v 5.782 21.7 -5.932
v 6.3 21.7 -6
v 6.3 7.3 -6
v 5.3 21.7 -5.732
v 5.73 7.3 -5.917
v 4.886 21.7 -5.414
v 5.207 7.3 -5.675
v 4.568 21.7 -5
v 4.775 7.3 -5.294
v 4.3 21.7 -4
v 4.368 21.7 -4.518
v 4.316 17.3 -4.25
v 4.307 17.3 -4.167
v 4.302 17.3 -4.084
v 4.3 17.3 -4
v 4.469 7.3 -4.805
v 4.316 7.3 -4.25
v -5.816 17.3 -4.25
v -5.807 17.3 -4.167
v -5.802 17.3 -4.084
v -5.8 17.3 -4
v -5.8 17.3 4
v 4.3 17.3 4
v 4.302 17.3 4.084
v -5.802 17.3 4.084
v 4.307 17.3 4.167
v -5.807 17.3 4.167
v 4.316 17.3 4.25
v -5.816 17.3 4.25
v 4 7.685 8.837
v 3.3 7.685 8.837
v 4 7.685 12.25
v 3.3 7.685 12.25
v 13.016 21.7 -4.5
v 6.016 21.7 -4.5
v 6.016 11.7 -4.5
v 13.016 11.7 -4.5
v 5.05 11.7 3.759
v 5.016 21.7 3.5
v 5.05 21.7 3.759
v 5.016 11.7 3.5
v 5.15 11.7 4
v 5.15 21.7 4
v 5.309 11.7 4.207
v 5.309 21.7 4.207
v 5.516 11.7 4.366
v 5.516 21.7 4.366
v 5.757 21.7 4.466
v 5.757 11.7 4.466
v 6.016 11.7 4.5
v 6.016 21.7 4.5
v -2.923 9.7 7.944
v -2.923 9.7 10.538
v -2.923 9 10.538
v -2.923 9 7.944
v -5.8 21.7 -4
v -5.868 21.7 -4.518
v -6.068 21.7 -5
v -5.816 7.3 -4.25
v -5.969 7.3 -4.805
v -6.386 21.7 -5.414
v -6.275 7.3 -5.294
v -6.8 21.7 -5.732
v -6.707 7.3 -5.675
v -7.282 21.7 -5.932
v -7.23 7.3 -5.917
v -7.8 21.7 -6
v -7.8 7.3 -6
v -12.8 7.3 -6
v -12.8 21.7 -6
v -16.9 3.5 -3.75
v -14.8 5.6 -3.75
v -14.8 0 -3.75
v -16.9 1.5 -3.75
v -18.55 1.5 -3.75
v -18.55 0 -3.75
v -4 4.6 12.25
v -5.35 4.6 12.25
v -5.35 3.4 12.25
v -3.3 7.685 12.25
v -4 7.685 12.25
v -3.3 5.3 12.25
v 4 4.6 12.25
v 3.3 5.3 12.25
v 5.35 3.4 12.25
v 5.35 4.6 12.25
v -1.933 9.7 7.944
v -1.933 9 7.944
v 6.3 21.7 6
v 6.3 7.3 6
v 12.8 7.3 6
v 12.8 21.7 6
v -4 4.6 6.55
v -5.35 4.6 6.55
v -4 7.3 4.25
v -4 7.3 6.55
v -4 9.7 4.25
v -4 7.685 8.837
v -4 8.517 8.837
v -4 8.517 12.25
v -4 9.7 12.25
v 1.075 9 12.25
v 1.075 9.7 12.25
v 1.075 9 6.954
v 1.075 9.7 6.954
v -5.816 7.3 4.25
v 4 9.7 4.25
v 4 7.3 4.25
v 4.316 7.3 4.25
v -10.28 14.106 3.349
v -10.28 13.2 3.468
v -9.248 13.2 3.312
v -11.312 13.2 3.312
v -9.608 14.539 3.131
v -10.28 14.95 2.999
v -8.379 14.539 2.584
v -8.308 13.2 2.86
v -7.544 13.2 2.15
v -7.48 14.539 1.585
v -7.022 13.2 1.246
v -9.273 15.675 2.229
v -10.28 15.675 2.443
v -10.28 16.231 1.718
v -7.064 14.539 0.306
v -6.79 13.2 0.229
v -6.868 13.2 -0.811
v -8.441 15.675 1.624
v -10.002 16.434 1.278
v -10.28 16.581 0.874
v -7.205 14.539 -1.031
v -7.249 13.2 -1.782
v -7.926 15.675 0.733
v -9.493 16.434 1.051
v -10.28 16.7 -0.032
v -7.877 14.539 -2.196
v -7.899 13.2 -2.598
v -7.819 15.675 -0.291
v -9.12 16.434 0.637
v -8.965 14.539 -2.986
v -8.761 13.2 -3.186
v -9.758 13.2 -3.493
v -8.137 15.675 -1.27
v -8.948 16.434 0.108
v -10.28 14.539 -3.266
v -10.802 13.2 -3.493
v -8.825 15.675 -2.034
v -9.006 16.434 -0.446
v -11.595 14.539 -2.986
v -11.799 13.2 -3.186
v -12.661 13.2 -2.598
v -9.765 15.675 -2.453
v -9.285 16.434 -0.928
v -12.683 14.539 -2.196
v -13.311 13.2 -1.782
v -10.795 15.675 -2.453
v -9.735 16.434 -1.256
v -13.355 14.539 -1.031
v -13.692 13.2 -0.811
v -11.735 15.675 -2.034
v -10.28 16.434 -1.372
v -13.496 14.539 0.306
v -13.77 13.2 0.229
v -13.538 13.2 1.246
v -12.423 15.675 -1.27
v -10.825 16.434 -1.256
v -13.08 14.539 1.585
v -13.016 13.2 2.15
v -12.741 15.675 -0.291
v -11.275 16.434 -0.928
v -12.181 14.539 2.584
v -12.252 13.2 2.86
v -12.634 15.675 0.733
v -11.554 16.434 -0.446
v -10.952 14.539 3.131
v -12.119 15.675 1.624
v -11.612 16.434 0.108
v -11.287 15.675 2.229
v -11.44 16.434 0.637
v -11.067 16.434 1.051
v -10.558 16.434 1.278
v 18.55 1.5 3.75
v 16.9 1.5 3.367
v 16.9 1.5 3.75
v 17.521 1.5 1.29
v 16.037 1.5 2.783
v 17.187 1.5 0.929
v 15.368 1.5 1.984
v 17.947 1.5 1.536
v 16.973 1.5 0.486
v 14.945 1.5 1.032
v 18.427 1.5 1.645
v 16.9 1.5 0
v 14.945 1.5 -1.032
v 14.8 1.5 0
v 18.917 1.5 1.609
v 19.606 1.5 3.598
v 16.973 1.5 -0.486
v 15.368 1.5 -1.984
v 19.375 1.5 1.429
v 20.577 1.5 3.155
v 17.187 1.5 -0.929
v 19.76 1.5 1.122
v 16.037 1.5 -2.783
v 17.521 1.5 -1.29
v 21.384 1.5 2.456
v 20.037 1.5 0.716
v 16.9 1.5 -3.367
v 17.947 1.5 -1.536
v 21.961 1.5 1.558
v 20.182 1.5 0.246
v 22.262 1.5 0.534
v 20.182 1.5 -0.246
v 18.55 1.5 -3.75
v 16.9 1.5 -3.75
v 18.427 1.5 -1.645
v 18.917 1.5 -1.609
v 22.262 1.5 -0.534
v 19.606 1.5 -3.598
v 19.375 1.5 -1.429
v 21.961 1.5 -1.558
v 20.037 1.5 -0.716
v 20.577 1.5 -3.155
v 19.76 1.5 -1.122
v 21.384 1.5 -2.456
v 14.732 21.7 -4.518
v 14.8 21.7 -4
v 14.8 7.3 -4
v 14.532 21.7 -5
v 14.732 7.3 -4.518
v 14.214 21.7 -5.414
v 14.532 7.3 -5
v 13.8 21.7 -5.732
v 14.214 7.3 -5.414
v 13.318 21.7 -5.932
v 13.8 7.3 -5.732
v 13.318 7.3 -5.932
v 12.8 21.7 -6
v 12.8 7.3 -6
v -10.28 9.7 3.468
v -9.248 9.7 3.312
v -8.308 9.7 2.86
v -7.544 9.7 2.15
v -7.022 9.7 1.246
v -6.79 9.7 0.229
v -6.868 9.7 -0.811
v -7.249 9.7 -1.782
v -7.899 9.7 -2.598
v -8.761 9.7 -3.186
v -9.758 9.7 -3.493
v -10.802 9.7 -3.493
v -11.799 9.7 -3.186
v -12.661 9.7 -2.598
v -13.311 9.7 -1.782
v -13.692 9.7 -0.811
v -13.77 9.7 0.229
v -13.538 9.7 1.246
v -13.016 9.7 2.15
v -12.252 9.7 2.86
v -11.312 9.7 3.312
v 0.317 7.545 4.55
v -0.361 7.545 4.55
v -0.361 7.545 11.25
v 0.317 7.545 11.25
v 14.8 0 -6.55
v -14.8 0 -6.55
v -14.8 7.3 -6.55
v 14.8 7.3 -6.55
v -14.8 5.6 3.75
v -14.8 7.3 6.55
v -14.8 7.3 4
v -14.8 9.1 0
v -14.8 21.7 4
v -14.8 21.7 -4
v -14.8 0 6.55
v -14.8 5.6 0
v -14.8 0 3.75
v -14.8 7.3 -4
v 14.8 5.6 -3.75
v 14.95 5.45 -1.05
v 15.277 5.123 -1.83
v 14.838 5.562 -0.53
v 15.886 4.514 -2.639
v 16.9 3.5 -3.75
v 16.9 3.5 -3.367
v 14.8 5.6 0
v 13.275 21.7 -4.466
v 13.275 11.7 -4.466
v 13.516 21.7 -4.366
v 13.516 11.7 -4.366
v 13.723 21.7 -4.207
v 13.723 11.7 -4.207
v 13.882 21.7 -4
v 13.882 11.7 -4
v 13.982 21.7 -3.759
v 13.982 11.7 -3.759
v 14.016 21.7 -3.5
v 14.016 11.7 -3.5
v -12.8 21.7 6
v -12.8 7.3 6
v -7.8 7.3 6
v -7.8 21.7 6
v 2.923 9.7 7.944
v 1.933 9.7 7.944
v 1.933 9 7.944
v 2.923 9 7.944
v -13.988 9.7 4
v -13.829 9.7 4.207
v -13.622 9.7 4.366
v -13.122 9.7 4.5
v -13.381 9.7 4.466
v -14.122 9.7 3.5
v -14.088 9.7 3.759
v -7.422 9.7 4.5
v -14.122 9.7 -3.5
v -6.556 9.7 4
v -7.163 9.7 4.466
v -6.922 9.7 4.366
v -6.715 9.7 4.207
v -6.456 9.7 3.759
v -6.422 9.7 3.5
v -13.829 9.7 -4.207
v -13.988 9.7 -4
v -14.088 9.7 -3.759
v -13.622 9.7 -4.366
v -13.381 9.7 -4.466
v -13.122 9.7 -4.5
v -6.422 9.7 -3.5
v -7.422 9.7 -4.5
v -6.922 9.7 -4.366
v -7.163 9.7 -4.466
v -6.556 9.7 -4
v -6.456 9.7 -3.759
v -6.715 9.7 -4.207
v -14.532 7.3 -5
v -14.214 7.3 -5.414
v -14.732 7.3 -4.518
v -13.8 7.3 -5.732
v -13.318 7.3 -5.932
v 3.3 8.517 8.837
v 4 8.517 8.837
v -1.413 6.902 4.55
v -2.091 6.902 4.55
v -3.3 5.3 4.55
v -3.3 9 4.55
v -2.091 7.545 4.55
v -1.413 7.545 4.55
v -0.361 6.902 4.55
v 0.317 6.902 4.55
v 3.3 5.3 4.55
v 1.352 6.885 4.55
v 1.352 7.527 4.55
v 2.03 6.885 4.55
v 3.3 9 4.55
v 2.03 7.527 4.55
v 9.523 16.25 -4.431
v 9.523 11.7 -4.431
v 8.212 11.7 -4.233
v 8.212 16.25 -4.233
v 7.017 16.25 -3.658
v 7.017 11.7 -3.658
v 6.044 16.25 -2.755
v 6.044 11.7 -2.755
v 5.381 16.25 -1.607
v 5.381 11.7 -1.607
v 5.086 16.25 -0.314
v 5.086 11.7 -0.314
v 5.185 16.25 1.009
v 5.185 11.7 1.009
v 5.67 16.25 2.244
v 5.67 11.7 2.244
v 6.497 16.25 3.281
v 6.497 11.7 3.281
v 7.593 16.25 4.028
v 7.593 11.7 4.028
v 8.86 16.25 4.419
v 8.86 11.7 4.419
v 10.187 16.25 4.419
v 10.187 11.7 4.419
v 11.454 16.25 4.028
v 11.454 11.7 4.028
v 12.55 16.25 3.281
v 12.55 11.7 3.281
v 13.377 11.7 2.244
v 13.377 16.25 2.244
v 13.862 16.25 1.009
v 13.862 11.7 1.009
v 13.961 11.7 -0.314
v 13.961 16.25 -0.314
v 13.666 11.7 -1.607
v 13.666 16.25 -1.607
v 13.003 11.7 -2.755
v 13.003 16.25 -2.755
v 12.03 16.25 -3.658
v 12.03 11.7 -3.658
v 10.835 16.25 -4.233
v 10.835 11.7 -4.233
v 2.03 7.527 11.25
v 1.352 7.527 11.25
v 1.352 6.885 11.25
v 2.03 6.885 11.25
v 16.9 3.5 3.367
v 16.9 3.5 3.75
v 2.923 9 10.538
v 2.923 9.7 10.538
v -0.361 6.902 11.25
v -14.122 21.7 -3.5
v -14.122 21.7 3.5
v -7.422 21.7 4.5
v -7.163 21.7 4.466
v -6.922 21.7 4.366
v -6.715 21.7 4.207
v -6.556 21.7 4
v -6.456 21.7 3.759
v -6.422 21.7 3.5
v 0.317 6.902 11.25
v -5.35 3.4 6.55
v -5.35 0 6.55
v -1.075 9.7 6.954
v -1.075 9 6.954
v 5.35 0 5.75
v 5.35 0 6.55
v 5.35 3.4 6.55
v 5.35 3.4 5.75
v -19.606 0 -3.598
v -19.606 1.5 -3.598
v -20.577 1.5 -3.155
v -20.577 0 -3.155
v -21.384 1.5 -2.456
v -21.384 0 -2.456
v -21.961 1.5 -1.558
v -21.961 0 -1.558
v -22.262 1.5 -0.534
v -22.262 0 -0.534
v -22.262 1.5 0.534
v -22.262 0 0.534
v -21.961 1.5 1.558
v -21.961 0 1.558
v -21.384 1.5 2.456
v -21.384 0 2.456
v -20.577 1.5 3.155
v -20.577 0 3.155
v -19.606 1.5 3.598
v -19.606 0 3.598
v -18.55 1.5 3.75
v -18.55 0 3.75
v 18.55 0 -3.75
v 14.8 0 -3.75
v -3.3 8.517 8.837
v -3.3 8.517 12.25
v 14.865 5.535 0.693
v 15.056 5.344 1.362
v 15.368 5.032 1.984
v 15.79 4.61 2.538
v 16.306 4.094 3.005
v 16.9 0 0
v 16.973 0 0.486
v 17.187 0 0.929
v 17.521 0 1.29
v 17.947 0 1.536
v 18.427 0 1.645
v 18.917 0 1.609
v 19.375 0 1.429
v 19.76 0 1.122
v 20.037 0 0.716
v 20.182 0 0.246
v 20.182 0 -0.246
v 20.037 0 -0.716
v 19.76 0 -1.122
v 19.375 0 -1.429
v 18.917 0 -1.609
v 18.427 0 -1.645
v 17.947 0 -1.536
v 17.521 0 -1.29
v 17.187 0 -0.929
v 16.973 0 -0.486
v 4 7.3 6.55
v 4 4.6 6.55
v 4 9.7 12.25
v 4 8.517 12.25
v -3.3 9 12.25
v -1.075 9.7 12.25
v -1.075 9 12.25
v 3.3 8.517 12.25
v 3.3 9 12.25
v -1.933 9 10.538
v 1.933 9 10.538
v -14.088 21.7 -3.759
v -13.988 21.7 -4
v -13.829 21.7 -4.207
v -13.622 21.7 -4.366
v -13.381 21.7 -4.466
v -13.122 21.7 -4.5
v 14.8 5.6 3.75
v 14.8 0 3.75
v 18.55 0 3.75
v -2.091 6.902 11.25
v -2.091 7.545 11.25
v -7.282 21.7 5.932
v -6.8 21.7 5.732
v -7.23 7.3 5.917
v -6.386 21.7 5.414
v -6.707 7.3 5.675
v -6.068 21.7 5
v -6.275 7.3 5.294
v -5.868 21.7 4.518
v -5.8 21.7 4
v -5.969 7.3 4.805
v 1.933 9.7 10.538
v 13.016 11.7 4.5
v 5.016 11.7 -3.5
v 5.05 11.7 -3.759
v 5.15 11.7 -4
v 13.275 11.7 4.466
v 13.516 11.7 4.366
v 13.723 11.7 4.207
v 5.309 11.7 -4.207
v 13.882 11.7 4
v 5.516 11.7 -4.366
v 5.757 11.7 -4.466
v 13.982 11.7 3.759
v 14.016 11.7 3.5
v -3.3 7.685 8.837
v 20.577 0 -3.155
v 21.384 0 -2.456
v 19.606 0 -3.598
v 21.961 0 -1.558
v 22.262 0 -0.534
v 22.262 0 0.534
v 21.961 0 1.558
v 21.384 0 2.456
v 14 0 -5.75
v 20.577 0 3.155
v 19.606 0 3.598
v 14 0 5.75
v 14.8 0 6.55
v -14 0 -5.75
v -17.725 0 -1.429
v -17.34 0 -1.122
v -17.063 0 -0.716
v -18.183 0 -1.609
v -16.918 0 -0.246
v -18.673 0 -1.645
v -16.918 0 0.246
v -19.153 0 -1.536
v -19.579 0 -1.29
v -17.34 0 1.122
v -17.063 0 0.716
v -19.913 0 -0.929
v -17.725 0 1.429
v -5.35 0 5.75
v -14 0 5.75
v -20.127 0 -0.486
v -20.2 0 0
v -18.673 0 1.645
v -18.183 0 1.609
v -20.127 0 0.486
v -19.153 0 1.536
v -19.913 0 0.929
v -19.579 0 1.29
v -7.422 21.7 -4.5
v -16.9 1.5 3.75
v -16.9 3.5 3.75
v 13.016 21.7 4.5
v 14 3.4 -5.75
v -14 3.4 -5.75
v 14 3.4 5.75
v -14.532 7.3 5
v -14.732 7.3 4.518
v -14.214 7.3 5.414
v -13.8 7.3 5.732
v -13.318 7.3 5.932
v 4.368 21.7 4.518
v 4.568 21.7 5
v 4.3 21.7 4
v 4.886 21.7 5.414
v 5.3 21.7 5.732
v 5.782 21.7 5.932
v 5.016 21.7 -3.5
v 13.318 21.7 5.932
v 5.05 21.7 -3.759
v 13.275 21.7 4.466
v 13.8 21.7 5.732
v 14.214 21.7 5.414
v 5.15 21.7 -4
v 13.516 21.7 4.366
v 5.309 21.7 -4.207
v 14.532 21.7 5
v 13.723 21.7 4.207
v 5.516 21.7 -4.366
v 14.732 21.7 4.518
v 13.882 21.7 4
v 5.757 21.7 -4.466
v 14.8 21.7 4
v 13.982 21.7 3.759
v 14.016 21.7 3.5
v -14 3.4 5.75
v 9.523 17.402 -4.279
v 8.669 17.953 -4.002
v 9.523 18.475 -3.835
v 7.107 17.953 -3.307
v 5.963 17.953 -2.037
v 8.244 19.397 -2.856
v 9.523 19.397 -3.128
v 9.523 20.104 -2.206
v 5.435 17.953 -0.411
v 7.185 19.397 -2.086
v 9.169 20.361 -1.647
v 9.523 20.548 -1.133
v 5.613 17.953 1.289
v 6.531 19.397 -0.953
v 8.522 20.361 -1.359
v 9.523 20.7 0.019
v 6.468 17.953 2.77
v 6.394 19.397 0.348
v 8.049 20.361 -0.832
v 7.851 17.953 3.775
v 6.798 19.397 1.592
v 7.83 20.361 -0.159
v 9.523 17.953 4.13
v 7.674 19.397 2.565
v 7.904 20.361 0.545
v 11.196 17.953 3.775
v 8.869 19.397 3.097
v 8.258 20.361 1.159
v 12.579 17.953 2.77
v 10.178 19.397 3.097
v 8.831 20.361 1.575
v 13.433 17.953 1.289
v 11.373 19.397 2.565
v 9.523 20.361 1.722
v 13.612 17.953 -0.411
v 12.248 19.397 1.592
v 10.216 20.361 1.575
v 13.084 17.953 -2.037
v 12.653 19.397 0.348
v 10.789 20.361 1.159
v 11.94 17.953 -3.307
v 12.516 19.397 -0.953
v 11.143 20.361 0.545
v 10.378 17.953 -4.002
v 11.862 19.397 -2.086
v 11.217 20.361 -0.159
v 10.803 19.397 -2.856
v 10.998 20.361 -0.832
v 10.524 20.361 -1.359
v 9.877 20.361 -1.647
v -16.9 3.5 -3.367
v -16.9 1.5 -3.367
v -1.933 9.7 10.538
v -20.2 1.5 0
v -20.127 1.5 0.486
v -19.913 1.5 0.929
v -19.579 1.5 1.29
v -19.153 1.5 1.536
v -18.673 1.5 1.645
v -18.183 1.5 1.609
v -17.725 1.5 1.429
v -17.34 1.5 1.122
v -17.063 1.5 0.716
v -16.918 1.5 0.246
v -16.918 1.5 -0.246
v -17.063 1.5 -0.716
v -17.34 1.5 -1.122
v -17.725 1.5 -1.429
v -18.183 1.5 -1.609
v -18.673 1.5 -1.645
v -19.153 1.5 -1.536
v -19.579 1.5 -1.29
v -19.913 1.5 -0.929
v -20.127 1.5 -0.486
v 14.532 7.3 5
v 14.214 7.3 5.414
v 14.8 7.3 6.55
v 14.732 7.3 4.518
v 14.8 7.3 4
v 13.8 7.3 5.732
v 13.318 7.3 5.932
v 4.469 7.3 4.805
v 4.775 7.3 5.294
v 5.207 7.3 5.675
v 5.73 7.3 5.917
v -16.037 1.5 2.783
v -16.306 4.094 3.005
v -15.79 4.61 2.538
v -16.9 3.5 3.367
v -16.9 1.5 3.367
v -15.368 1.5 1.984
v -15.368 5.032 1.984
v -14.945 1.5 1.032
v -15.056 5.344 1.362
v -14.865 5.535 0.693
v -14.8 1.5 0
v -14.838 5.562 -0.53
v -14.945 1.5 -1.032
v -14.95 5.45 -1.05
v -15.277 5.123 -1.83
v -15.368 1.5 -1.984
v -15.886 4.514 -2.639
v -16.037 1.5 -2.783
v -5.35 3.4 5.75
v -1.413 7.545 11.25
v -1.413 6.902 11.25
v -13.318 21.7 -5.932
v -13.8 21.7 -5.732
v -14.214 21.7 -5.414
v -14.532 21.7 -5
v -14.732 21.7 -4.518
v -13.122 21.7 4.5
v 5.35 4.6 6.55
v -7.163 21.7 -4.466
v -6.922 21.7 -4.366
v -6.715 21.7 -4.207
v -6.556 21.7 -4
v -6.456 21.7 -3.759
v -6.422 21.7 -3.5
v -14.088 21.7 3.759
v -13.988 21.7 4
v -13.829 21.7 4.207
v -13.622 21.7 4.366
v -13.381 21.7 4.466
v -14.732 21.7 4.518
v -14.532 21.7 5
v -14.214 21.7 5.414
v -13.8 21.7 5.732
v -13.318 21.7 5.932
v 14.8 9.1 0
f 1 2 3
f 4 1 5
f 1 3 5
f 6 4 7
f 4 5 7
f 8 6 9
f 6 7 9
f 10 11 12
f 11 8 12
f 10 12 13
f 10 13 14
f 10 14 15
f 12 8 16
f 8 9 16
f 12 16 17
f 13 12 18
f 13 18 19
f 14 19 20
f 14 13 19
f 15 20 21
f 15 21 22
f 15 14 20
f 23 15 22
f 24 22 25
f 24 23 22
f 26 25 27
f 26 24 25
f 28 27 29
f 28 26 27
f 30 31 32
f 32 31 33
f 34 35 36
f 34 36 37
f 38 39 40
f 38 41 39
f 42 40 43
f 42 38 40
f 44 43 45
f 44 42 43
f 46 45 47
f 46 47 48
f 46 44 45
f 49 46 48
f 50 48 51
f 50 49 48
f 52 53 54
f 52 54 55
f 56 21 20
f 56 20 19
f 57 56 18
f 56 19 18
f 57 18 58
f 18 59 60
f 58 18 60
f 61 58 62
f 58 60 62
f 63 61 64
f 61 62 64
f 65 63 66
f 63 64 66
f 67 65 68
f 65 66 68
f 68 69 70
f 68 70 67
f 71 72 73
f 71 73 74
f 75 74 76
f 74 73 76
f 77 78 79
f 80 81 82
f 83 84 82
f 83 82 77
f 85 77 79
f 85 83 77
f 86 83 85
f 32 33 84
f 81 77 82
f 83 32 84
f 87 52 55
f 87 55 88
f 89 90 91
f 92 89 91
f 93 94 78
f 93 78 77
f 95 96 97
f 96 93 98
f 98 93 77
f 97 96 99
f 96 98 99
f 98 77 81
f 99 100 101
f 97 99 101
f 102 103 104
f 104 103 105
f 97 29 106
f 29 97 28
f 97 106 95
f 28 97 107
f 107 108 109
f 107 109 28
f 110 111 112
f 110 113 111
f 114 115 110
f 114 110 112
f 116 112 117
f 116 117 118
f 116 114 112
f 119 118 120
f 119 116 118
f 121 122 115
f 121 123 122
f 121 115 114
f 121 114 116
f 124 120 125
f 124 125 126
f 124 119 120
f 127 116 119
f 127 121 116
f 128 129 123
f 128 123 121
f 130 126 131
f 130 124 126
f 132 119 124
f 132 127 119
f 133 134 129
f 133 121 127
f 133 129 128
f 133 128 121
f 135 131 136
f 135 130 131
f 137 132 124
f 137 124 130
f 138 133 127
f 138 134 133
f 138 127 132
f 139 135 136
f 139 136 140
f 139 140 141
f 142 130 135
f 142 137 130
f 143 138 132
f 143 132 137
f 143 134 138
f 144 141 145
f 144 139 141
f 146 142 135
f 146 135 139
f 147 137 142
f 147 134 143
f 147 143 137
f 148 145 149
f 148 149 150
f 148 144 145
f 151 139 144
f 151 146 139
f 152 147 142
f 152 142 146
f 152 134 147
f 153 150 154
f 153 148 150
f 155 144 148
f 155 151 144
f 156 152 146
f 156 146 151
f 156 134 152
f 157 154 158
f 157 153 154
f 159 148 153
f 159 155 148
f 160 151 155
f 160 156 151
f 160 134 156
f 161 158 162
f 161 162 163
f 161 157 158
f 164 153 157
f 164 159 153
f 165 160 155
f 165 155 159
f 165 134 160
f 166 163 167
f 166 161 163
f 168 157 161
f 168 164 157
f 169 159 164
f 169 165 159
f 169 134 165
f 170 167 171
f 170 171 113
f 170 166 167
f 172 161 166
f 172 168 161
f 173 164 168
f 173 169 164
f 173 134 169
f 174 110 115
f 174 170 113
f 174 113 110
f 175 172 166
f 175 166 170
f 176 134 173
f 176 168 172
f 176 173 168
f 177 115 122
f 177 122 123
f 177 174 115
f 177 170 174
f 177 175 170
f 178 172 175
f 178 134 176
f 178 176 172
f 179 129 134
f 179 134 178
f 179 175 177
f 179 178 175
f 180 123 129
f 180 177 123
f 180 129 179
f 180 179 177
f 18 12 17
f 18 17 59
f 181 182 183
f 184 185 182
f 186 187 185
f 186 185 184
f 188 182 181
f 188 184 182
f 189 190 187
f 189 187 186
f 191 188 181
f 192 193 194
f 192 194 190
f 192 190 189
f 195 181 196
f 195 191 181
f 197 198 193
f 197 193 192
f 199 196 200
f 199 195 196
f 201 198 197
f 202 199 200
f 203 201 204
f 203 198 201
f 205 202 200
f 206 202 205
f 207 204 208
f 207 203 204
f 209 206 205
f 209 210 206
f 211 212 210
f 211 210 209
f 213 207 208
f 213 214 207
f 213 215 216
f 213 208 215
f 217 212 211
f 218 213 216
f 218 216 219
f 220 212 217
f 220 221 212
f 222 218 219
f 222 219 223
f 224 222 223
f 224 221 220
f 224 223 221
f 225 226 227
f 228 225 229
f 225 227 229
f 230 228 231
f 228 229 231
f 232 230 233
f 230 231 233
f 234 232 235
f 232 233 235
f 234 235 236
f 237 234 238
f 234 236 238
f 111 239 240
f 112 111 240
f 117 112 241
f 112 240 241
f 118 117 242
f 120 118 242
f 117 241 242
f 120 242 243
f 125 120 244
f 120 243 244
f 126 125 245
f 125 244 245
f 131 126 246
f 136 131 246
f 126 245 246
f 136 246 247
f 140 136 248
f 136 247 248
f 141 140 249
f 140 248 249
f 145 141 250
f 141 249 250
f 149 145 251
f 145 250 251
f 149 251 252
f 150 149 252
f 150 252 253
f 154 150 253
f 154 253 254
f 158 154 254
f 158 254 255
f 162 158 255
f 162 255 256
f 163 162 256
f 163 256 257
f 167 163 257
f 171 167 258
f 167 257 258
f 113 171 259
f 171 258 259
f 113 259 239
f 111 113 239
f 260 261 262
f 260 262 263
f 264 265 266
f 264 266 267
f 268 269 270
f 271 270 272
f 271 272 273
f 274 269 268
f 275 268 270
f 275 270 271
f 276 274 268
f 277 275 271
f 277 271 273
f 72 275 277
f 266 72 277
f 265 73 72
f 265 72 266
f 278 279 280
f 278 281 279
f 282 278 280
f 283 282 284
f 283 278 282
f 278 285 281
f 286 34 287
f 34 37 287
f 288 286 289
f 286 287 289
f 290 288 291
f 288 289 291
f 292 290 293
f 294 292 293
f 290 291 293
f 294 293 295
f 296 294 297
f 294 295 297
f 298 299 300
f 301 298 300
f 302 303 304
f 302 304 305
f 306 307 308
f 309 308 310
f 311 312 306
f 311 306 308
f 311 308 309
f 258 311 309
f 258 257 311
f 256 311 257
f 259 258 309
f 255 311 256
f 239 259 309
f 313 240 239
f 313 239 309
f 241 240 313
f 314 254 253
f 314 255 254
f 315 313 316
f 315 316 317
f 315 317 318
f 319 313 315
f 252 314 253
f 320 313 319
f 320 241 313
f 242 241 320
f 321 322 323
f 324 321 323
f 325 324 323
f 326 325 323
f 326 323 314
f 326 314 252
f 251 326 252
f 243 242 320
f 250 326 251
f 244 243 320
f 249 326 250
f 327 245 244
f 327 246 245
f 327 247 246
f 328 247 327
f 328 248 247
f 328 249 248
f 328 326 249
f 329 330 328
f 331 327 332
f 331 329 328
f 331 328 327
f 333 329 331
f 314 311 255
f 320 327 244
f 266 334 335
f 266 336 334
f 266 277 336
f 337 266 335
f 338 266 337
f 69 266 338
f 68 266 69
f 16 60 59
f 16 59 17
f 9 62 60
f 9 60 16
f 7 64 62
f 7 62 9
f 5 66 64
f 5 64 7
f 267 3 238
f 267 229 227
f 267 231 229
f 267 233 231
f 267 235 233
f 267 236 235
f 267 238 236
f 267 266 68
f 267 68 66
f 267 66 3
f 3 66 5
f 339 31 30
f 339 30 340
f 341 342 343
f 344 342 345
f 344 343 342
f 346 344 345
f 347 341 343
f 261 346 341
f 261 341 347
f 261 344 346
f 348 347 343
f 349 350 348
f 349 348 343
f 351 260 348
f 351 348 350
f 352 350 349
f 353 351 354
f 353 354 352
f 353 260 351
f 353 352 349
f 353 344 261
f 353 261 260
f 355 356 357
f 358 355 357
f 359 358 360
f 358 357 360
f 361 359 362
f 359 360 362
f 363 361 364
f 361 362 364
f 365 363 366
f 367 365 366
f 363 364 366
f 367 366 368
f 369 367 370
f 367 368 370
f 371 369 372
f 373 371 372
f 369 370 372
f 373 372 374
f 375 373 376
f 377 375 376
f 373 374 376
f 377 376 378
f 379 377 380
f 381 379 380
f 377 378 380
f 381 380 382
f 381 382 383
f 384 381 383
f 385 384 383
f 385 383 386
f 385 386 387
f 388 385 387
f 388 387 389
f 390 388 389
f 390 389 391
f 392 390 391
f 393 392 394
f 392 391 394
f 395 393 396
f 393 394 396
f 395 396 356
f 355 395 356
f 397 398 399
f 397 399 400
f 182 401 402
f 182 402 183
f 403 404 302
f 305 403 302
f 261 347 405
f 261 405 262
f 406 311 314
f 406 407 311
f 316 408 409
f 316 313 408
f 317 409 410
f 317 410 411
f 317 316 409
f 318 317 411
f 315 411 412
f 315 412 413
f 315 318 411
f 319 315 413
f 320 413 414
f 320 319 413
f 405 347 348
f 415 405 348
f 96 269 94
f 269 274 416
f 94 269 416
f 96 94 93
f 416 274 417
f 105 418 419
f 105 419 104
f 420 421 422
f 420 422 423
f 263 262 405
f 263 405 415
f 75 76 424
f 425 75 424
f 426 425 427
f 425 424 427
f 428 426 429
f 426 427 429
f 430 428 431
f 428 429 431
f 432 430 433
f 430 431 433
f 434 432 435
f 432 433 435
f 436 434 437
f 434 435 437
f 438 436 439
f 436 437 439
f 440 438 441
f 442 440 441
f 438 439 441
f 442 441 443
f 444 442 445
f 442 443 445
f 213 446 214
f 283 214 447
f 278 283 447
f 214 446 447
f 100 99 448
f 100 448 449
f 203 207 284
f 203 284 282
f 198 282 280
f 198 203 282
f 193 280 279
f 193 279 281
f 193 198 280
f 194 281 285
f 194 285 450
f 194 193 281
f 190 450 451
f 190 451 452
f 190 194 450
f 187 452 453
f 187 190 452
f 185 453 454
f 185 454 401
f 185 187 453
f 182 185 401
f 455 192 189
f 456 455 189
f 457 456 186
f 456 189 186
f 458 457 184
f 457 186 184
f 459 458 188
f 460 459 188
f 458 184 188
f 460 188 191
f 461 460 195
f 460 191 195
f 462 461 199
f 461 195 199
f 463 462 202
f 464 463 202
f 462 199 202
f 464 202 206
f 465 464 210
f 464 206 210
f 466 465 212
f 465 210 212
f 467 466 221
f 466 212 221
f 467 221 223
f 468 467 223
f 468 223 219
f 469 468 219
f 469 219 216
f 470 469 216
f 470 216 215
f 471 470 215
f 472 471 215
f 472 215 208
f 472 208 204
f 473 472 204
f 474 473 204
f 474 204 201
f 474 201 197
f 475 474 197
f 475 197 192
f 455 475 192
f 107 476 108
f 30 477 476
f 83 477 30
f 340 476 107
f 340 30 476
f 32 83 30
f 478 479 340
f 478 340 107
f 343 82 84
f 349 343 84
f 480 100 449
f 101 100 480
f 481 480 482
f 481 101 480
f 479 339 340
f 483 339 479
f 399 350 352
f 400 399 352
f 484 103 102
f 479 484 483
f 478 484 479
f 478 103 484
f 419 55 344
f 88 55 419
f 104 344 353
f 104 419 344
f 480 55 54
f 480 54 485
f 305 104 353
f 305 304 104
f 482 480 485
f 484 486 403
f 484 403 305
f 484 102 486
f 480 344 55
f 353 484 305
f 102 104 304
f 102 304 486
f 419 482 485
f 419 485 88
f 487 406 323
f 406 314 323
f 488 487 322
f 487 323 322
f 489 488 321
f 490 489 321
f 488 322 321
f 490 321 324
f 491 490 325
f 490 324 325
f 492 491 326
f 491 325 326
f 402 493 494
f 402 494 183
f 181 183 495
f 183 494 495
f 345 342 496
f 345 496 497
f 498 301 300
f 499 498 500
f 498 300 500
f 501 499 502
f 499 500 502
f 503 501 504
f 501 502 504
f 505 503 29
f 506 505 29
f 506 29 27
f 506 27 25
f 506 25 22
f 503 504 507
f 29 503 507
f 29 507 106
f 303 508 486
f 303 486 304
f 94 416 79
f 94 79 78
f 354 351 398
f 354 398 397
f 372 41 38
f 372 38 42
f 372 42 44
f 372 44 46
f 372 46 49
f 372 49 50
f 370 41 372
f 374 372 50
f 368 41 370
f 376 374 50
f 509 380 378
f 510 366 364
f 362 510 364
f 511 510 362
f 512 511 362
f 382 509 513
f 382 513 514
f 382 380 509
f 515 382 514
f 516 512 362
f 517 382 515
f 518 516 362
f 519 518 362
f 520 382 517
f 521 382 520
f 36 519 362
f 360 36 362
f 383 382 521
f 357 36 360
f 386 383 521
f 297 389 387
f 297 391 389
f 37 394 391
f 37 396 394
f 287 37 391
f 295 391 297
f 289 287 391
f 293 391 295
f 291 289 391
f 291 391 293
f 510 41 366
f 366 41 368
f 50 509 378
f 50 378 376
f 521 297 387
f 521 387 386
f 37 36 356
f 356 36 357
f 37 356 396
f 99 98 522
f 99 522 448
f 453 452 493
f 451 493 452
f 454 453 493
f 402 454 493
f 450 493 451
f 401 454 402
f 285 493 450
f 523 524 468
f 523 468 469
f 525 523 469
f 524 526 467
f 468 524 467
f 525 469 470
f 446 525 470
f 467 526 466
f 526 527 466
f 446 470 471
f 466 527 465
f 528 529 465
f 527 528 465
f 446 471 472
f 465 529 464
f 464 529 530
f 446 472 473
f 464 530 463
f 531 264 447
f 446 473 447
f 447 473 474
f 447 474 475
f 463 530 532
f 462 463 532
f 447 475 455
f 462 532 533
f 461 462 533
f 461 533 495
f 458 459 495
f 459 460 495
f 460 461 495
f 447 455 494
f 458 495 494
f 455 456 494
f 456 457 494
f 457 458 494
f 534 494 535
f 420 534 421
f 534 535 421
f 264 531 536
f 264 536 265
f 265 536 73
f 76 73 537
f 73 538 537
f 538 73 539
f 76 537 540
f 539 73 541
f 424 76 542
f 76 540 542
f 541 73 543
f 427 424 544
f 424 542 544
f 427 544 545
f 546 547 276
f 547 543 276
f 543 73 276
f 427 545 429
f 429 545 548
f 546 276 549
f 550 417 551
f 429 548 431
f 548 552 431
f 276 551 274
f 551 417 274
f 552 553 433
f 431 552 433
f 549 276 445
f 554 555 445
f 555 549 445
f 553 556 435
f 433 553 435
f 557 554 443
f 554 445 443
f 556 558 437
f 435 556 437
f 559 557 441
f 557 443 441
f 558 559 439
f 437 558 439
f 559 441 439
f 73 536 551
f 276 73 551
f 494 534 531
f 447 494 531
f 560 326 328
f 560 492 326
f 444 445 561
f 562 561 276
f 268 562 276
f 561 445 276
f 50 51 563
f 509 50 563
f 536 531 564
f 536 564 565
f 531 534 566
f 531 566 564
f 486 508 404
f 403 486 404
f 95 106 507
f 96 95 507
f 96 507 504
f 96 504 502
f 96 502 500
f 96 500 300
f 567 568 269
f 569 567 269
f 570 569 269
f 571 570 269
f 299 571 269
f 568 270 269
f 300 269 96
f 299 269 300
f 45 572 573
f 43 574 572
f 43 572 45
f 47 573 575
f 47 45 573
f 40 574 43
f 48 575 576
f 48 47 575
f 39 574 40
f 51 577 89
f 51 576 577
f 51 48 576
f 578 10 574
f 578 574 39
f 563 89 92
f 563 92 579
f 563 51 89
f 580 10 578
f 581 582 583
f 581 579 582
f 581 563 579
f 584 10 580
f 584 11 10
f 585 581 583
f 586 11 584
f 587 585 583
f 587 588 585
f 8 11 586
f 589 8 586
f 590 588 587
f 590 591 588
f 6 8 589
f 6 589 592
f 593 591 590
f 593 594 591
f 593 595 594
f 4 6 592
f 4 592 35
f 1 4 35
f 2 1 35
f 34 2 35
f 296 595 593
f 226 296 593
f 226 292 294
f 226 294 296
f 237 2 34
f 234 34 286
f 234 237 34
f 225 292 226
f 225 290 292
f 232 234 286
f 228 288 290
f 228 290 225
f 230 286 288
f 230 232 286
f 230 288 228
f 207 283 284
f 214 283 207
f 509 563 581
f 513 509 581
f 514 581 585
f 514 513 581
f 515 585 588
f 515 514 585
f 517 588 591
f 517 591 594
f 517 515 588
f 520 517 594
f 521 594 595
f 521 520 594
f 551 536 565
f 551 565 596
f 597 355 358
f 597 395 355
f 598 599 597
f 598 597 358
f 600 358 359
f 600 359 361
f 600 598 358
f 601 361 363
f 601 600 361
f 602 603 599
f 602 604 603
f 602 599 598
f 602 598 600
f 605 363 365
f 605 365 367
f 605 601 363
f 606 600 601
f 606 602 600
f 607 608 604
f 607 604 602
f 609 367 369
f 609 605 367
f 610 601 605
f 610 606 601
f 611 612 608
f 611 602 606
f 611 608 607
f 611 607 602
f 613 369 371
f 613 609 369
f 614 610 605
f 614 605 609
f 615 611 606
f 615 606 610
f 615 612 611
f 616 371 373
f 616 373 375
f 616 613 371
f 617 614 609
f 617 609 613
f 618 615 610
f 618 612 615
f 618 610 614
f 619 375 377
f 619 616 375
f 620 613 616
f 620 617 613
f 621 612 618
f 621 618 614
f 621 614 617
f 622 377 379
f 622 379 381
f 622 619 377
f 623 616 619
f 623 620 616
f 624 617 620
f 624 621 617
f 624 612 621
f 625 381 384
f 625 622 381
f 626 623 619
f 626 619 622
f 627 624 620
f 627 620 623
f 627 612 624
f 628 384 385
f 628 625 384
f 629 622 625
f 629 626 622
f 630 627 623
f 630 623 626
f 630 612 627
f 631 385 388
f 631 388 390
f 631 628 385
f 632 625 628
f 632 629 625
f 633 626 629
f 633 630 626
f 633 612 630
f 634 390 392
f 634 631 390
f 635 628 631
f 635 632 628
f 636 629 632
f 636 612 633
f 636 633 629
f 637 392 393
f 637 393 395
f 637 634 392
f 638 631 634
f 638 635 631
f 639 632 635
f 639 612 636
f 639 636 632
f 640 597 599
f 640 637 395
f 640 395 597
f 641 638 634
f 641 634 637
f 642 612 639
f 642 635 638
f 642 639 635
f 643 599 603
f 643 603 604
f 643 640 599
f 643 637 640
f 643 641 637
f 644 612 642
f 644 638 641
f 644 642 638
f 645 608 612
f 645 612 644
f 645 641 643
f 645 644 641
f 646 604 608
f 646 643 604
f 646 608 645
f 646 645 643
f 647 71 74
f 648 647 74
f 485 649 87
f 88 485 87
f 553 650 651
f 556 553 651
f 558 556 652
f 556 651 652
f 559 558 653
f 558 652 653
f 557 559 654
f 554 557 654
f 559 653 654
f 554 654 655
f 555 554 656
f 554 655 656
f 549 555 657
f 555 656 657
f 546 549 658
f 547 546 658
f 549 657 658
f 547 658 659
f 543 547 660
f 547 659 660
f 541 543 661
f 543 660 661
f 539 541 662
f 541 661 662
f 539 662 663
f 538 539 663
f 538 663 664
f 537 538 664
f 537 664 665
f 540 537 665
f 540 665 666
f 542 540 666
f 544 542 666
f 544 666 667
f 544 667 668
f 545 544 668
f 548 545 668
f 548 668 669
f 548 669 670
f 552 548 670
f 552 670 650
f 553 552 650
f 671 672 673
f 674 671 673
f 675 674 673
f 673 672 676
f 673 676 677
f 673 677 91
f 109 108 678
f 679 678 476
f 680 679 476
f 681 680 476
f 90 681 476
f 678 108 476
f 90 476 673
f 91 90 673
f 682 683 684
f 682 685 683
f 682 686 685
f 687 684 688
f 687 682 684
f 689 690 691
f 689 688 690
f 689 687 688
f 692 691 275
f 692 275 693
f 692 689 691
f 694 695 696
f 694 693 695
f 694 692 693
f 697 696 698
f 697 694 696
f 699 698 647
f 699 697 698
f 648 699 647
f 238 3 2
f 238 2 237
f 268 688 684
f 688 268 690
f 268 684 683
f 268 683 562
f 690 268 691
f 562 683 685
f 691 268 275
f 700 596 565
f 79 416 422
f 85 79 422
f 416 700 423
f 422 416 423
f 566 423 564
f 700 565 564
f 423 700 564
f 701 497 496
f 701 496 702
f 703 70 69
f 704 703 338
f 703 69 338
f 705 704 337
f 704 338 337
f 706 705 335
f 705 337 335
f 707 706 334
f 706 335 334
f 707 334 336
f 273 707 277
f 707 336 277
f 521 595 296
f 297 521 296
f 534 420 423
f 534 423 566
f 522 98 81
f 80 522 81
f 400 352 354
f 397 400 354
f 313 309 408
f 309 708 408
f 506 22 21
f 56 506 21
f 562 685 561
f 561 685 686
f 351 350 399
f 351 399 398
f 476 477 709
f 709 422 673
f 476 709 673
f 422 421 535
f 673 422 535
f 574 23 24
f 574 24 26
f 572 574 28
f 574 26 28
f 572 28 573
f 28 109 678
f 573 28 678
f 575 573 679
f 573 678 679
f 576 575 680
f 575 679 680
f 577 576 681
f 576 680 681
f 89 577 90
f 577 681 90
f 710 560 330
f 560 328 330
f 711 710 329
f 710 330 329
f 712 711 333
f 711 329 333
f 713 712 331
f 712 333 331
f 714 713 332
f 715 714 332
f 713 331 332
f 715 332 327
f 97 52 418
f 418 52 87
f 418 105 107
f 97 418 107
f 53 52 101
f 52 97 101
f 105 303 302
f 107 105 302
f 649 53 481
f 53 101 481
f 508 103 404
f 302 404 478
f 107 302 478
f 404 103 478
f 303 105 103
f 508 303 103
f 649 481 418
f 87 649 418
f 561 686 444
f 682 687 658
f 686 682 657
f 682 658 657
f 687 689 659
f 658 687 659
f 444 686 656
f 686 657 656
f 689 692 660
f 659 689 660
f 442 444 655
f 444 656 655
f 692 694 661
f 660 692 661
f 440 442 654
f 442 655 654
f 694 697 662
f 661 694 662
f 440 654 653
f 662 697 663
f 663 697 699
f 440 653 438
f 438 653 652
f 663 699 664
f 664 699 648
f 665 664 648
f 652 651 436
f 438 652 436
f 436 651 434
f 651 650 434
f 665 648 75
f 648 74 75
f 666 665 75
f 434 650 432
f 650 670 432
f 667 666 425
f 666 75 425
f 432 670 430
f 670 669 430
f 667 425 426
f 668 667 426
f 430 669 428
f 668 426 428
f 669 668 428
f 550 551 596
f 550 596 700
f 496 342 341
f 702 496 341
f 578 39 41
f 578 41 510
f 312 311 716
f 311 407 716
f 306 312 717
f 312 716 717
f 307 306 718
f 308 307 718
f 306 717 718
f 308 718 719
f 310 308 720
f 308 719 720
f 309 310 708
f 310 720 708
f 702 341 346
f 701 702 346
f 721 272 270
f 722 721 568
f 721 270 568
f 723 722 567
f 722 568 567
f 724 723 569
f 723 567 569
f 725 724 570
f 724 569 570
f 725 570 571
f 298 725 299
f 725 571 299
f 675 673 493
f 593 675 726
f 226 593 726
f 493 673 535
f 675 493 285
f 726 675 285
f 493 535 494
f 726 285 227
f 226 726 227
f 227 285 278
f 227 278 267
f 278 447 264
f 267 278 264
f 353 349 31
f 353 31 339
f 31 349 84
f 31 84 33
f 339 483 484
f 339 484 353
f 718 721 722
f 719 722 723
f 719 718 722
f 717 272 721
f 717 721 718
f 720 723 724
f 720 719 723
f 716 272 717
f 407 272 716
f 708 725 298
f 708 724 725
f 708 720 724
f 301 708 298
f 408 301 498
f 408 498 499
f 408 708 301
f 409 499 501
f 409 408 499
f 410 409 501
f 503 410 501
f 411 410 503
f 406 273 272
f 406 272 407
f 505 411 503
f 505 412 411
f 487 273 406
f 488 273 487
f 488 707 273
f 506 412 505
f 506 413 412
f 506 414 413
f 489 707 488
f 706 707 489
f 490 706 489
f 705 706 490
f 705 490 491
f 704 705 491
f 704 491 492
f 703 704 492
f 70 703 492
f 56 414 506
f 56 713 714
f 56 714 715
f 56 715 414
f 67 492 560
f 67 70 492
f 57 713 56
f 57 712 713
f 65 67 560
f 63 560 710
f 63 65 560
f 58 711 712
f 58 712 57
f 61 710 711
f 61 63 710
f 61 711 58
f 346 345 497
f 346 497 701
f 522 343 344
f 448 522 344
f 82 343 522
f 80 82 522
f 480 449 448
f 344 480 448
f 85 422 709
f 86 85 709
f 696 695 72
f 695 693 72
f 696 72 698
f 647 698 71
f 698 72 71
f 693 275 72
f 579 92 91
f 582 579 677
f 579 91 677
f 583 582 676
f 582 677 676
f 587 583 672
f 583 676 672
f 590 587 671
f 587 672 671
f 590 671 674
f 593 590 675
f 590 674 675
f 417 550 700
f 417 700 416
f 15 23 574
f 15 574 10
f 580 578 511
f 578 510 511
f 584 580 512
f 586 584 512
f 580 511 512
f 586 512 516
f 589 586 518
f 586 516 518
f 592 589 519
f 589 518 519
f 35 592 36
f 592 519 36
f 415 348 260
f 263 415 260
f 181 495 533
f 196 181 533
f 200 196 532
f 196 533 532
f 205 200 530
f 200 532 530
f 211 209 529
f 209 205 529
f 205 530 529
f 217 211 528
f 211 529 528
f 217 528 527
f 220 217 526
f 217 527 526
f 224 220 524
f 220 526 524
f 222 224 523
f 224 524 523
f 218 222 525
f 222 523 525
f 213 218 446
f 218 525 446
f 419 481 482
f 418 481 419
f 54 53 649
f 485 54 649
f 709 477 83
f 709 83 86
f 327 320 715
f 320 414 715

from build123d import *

# Parameters (mm, degrees)
SKETCH_1_W           = 29.6
SKETCH_1_H           = 13.1
EXTRUDE_1_DEPTH      = 7.3
SKETCH_2_W           = 10.5
SKETCH_2_H           = 12
SKETCH_2_W_2         = 9
EXTRUDE_2_DEPTH      = 14.4
SKETCH_3_W           = 10.1
SKETCH_3_H           = 8.5
EXTRUDE_3_DEPTH      = 10
FILLET_1_R           = 2
SKETCH_4_W           = 9
SKETCH_4_H           = 9
SKETCH_4_W_2         = 7.7
CUT_EXTRUDE_2_DEPTH  = 10
EXTRUDE_4_DEPTH      = 5.6
CUT_EXTRUDE_3_DEPTH  = 12.6
SKETCH_8_R           = 3.75
CUT_EXTRUDE_4_DEPTH  = 7.6
SKETCH_9_R           = 1.65
CUT_EXTRUDE_5_DEPTH  = 7.6
CUT_EXTRUDE_6_DEPTH  = 3.4
SKETCH_11_W          = 10.7
SKETCH_11_H          = 1.2
EXTRUDE_5_DEPTH      = 5.7
EXTRUDE_6_REACH      = 38.354
SKETCH_12_W          = 8
SKETCH_12_H          = 5.1
SKETCH_13_W          = 6.6
SKETCH_13_H          = 3.7
CUT_EXTRUDE_7_DEPTH  = 7.7
SKETCH_14_W          = 3.413404973
SKETCH_14_H          = 0.831634307
CUT_EXTRUDE_8_DEPTH  = 9.7
SKETCH_15_W          = 0.989303902
SKETCH_15_H          = 2.593580499
SKETCH_15_W_2        = 2.149434462
SKETCH_15_H_2        = 5.296205569
CUT_EXTRUDE_9_DEPTH  = 2.7
SKETCH_16_W          = 0.67786387
SKETCH_16_H          = 0.642186824
SKETCH_16_W_2        = 0.677863869
SKETCH_16_H_2        = 0.642186825
EXTRUDE_7_DEPTH      = 6.7
SKETCH_17_R          = 4.45
EXTRUDE_8_DEPTH      = 9
FILLET_3_R           = 4.45
FILLET_4_R           = 1
SKETCH_18_W          = 7.7
SKETCH_18_H          = 9
CUT_EXTRUDE_10_DEPTH = 2
SKETCH_19_R          = 3.5
EXTRUDE_9_DEPTH      = 7
FILLET_6_R           = 3.5
FILLET_7_R           = 1


with BuildPart() as part:
    # 草图1 → 凸台-拉伸1 (new body)
    with BuildSketch(Plane(origin=(0, 0, 0), x_dir=(1, 0, 0), z_dir=(0, 1, 0))):
        Rectangle(SKETCH_1_W, SKETCH_1_H)
    extrude(amount=EXTRUDE_1_DEPTH)

    # 草图2 → 凸台-拉伸2 (add)
    with BuildSketch(Plane(origin=(0, 7.3, 0), x_dir=(1, 0, 0), z_dir=(0, 1, 0))):
        with Locations((9.55, 0)):
            Rectangle(SKETCH_2_W, SKETCH_2_H)
        with Locations((-10.3, 0)):
            Rectangle(SKETCH_2_W_2, SKETCH_2_H)
    extrude(amount=EXTRUDE_2_DEPTH)

    # 草图3 → 凸台-拉伸3 (add)
    with BuildSketch(Plane(origin=(0, 7.3, 0), x_dir=(1, 0, 0), z_dir=(0, 1, 0))):
        with Locations((-0.75, 0)):
            Rectangle(SKETCH_3_W, SKETCH_3_H)
    extrude(amount=EXTRUDE_3_DEPTH)

    # 圆角1
    # the kernel refuses this fillet: 2 mm, written as the material it takes off along each edge
    with BuildSketch(Plane(origin=(14.8, 7.3, 6), x_dir=(0, 0, -1), z_dir=(0, 1, 0)), Plane(origin=(-14.8, 7.3, -6), x_dir=(0, 0, 1), z_dir=(0, 1, 0))) as fillet_1_piece_1:
        with BuildLine():
            CenterArc((FILLET_1_R, FILLET_1_R), FILLET_1_R, 180, 90)
            Line((0, FILLET_1_R), (0, 0))
            Line((0, 0), (FILLET_1_R, 0))
        make_face()
    extrude(amount=19.4, mode=Mode.SUBTRACT)
    with BuildSketch(Plane(origin=(4.3, 7.3, 6), x_dir=(1, 0, 0), z_dir=(0, 1, 0))) as fillet_1_piece_2_section:
        with BuildLine():
            CenterArc((FILLET_1_R, FILLET_1_R), FILLET_1_R, 180, 90)
            Line((0, FILLET_1_R), (0, 0))
            Line((0, 0), (FILLET_1_R, 0))
        make_face()
    fillet_1_piece_2 = extrude(amount=19.4, mode=Mode.PRIVATE)
    fillet_1_piece_2 = split(fillet_1_piece_2, bisect_by=Plane(origin=(4.75805712, 12.3, 4.25), z_dir=(0, 0, 1)), keep=Keep.TOP, mode=Mode.PRIVATE)
    fillet_1_piece_2 = split(fillet_1_piece_2, bisect_by=Plane(origin=(4.75805712, 17.3, 5.563068428), z_dir=(0, -1, 0)), keep=Keep.TOP, mode=Mode.PRIVATE)
    add(fillet_1_piece_2, mode=Mode.SUBTRACT)
    with BuildSketch(Plane(origin=(4.3, 7.3, 6), x_dir=(1, 0, 0), z_dir=(0, 1, 0))) as fillet_1_piece_3_section:
        with BuildLine():
            CenterArc((FILLET_1_R, FILLET_1_R), FILLET_1_R, 180, 90)
            Line((0, FILLET_1_R), (0, 0))
            Line((0, 0), (FILLET_1_R, 0))
        make_face()
    fillet_1_piece_3 = extrude(amount=19.4, mode=Mode.PRIVATE)
    fillet_1_piece_3 = split(fillet_1_piece_3, bisect_by=Plane(origin=(4.75805712, 22, 4.25), z_dir=(0, 0, 1)), keep=Keep.TOP, mode=Mode.PRIVATE)
    fillet_1_piece_3 = split(fillet_1_piece_3, bisect_by=Plane(origin=(4.75805712, 17.3, 5.563068428), z_dir=(0, 1, 0)), keep=Keep.TOP, mode=Mode.PRIVATE)
    add(fillet_1_piece_3, mode=Mode.SUBTRACT)
    with BuildSketch(Plane(origin=(4.3, 7.3, 6), x_dir=(1, 0, 0), z_dir=(0, 1, 0))) as fillet_1_piece_4_section:
        with BuildLine():
            CenterArc((FILLET_1_R, FILLET_1_R), FILLET_1_R, 180, 90)
            Line((0, FILLET_1_R), (0, 0))
            Line((0, 0), (FILLET_1_R, 0))
        make_face()
    fillet_1_piece_4 = extrude(amount=19.4, mode=Mode.PRIVATE)
    fillet_1_piece_4 = split(fillet_1_piece_4, bisect_by=Plane(origin=(4.282851875, 22, 4.25), z_dir=(0, 0, -1)), keep=Keep.TOP, mode=Mode.PRIVATE)
    fillet_1_piece_4 = split(fillet_1_piece_4, bisect_by=Plane(origin=(4.282851875, 17.3, 4.132221144), z_dir=(0, 1, 0)), keep=Keep.TOP, mode=Mode.PRIVATE)
    add(fillet_1_piece_4, mode=Mode.SUBTRACT)
    with BuildSketch(Plane(origin=(14.8, 7.3, -6), x_dir=(0, 0, 1), z_dir=(0, 1, 0)), Plane(origin=(-14.8, 7.3, 6), x_dir=(0, 0, -1), z_dir=(0, 1, 0))) as fillet_1_piece_5:
        with BuildLine():
            CenterArc((FILLET_1_R, -FILLET_1_R), FILLET_1_R, 90, 90)
            Line((0, -FILLET_1_R), (0, 0))
            Line((0, 0), (FILLET_1_R, 0))
        make_face()
    extrude(amount=19.4, mode=Mode.SUBTRACT)
    with BuildSketch(Plane(origin=(4.3, 7.3, -6), x_dir=(1, 0, 0), z_dir=(0, 1, 0))) as fillet_1_piece_6_section:
        with BuildLine():
            CenterArc((FILLET_1_R, -FILLET_1_R), FILLET_1_R, 90, 90)
            Line((0, -FILLET_1_R), (0, 0))
            Line((0, 0), (FILLET_1_R, 0))
        make_face()
    fillet_1_piece_6 = extrude(amount=19.4, mode=Mode.PRIVATE)
    fillet_1_piece_6 = split(fillet_1_piece_6, bisect_by=Plane(origin=(4.75805712, 12.3, -4.25), z_dir=(0, 0, -1)), keep=Keep.TOP, mode=Mode.PRIVATE)
    fillet_1_piece_6 = split(fillet_1_piece_6, bisect_by=Plane(origin=(4.75805712, 17.3, -5.563068428), z_dir=(0, -1, 0)), keep=Keep.TOP, mode=Mode.PRIVATE)
    add(fillet_1_piece_6, mode=Mode.SUBTRACT)
    with BuildSketch(Plane(origin=(4.3, 7.3, -6), x_dir=(1, 0, 0), z_dir=(0, 1, 0))) as fillet_1_piece_7_section:
        with BuildLine():
            CenterArc((FILLET_1_R, -FILLET_1_R), FILLET_1_R, 90, 90)
            Line((0, -FILLET_1_R), (0, 0))
            Line((0, 0), (FILLET_1_R, 0))
        make_face()
    fillet_1_piece_7 = extrude(amount=19.4, mode=Mode.PRIVATE)
    fillet_1_piece_7 = split(fillet_1_piece_7, bisect_by=Plane(origin=(4.75805712, 22, -4.25), z_dir=(0, 0, -1)), keep=Keep.TOP, mode=Mode.PRIVATE)
    fillet_1_piece_7 = split(fillet_1_piece_7, bisect_by=Plane(origin=(4.75805712, 17.3, -5.563068428), z_dir=(0, 1, 0)), keep=Keep.TOP, mode=Mode.PRIVATE)
    add(fillet_1_piece_7, mode=Mode.SUBTRACT)
    with BuildSketch(Plane(origin=(4.3, 7.3, -6), x_dir=(1, 0, 0), z_dir=(0, 1, 0))) as fillet_1_piece_8_section:
        with BuildLine():
            CenterArc((FILLET_1_R, -FILLET_1_R), FILLET_1_R, 90, 90)
            Line((0, -FILLET_1_R), (0, 0))
            Line((0, 0), (FILLET_1_R, 0))
        make_face()
    fillet_1_piece_8 = extrude(amount=19.4, mode=Mode.PRIVATE)
    fillet_1_piece_8 = split(fillet_1_piece_8, bisect_by=Plane(origin=(4.282851875, 22, -4.25), z_dir=(0, 0, 1)), keep=Keep.TOP, mode=Mode.PRIVATE)
    fillet_1_piece_8 = split(fillet_1_piece_8, bisect_by=Plane(origin=(4.282851875, 17.3, -4.132221144), z_dir=(0, 1, 0)), keep=Keep.TOP, mode=Mode.PRIVATE)
    add(fillet_1_piece_8, mode=Mode.SUBTRACT)
    with BuildSketch(Plane(origin=(-5.8, 7.3, -6), x_dir=(-1, 0, 0), z_dir=(0, 1, 0))) as fillet_1_piece_9_section:
        with BuildLine():
            CenterArc((FILLET_1_R, FILLET_1_R), FILLET_1_R, 180, 90)
            Line((0, FILLET_1_R), (0, 0))
            Line((0, 0), (FILLET_1_R, 0))
        make_face()
    fillet_1_piece_9 = extrude(amount=19.4, mode=Mode.PRIVATE)
    fillet_1_piece_9 = split(fillet_1_piece_9, bisect_by=Plane(origin=(-6.25805712, 12.3, -4.25), z_dir=(0, 0, -1)), keep=Keep.TOP, mode=Mode.PRIVATE)
    fillet_1_piece_9 = split(fillet_1_piece_9, bisect_by=Plane(origin=(-6.25805712, 17.3, -5.563068428), z_dir=(0, -1, 0)), keep=Keep.TOP, mode=Mode.PRIVATE)
    add(fillet_1_piece_9, mode=Mode.SUBTRACT)
    with BuildSketch(Plane(origin=(-5.8, 7.3, -6), x_dir=(-1, 0, 0), z_dir=(0, 1, 0))) as fillet_1_piece_10_section:
        with BuildLine():
            CenterArc((FILLET_1_R, FILLET_1_R), FILLET_1_R, 180, 90)
            Line((0, FILLET_1_R), (0, 0))
            Line((0, 0), (FILLET_1_R, 0))
        make_face()
    fillet_1_piece_10 = extrude(amount=19.4, mode=Mode.PRIVATE)
    fillet_1_piece_10 = split(fillet_1_piece_10, bisect_by=Plane(origin=(-6.25805712, 22, -4.25), z_dir=(0, 0, -1)), keep=Keep.TOP, mode=Mode.PRIVATE)
    fillet_1_piece_10 = split(fillet_1_piece_10, bisect_by=Plane(origin=(-6.25805712, 17.3, -5.563068428), z_dir=(0, 1, 0)), keep=Keep.TOP, mode=Mode.PRIVATE)
    add(fillet_1_piece_10, mode=Mode.SUBTRACT)
    with BuildSketch(Plane(origin=(-5.8, 7.3, -6), x_dir=(-1, 0, 0), z_dir=(0, 1, 0))) as fillet_1_piece_11_section:
        with BuildLine():
            CenterArc((FILLET_1_R, FILLET_1_R), FILLET_1_R, 180, 90)
            Line((0, FILLET_1_R), (0, 0))
            Line((0, 0), (FILLET_1_R, 0))
        make_face()
    fillet_1_piece_11 = extrude(amount=19.4, mode=Mode.PRIVATE)
    fillet_1_piece_11 = split(fillet_1_piece_11, bisect_by=Plane(origin=(-5.782851875, 22, -4.25), z_dir=(0, 0, 1)), keep=Keep.TOP, mode=Mode.PRIVATE)
    fillet_1_piece_11 = split(fillet_1_piece_11, bisect_by=Plane(origin=(-5.782851875, 17.3, -4.132221144), z_dir=(0, 1, 0)), keep=Keep.TOP, mode=Mode.PRIVATE)
    add(fillet_1_piece_11, mode=Mode.SUBTRACT)
    with BuildSketch(Plane(origin=(-5.8, 7.3, 6), x_dir=(-1, 0, 0), z_dir=(0, 1, 0))) as fillet_1_piece_12_section:
        with BuildLine():
            CenterArc((FILLET_1_R, -FILLET_1_R), FILLET_1_R, 90, 90)
            Line((0, -FILLET_1_R), (0, 0))
            Line((0, 0), (FILLET_1_R, 0))
        make_face()
    fillet_1_piece_12 = extrude(amount=19.4, mode=Mode.PRIVATE)
    fillet_1_piece_12 = split(fillet_1_piece_12, bisect_by=Plane(origin=(-6.25805712, 17.3, 5.563068428), z_dir=(0, -1, 0)), keep=Keep.TOP, mode=Mode.PRIVATE)
    fillet_1_piece_12 = split(fillet_1_piece_12, bisect_by=Plane(origin=(-6.25805712, 12.3, 4.25), z_dir=(0, 0, 1)), keep=Keep.TOP, mode=Mode.PRIVATE)
    add(fillet_1_piece_12, mode=Mode.SUBTRACT)
    with BuildSketch(Plane(origin=(-5.8, 7.3, 6), x_dir=(-1, 0, 0), z_dir=(0, 1, 0))) as fillet_1_piece_13_section:
        with BuildLine():
            CenterArc((FILLET_1_R, -FILLET_1_R), FILLET_1_R, 90, 90)
            Line((0, -FILLET_1_R), (0, 0))
            Line((0, 0), (FILLET_1_R, 0))
        make_face()
    fillet_1_piece_13 = extrude(amount=19.4, mode=Mode.PRIVATE)
    fillet_1_piece_13 = split(fillet_1_piece_13, bisect_by=Plane(origin=(-6.25805712, 17.3, 5.563068428), z_dir=(0, 1, 0)), keep=Keep.TOP, mode=Mode.PRIVATE)
    fillet_1_piece_13 = split(fillet_1_piece_13, bisect_by=Plane(origin=(-6.25805712, 22, 4.25), z_dir=(0, 0, 1)), keep=Keep.TOP, mode=Mode.PRIVATE)
    add(fillet_1_piece_13, mode=Mode.SUBTRACT)
    with BuildSketch(Plane(origin=(-5.8, 7.3, 6), x_dir=(-1, 0, 0), z_dir=(0, 1, 0))) as fillet_1_piece_14_section:
        with BuildLine():
            CenterArc((FILLET_1_R, -FILLET_1_R), FILLET_1_R, 90, 90)
            Line((0, -FILLET_1_R), (0, 0))
            Line((0, 0), (FILLET_1_R, 0))
        make_face()
    fillet_1_piece_14 = extrude(amount=19.4, mode=Mode.PRIVATE)
    fillet_1_piece_14 = split(fillet_1_piece_14, bisect_by=Plane(origin=(-5.782851875, 17.3, 4.132221144), z_dir=(0, 1, 0)), keep=Keep.TOP, mode=Mode.PRIVATE)
    fillet_1_piece_14 = split(fillet_1_piece_14, bisect_by=Plane(origin=(-5.782851875, 22, 4.25), z_dir=(0, 0, -1)), keep=Keep.TOP, mode=Mode.PRIVATE)
    add(fillet_1_piece_14, mode=Mode.SUBTRACT)

    # 草图4 → 切除-拉伸2 (cut)
    with BuildSketch(Plane(origin=(0, 21.7, 0), x_dir=(1, 0, 0), z_dir=(0, 1, 0))):
        with Locations((9.516278165, 0)):
            Rectangle(SKETCH_4_W, SKETCH_4_H)
        with Locations((-10.271744936, 0)):
            Rectangle(SKETCH_4_W_2, SKETCH_4_H)
    extrude(amount=-CUT_EXTRUDE_2_DEPTH, mode=Mode.SUBTRACT)

    # 草图5 → 凸台-拉伸4 (add)
    with BuildSketch(Plane.XZ):
        with BuildLine():
            Line((-18.55, 3.75), (18.55, 3.75))
            ThreePointArc((18.55, 3.75), (22.3, 0), (18.55, -3.75))
            Line((18.55, -3.75), (-18.55, -3.75))
            ThreePointArc((-18.55, -3.75), (-22.3, 0), (-18.55, 3.75))
        make_face()
    extrude(amount=-EXTRUDE_4_DEPTH)

    # 草图6 → 切除-拉伸3 (cut)
    with BuildSketch(Plane(origin=(0, 0, -3.75), x_dir=(-1, 0, 0), z_dir=(0, 0, -1))):
        Polygon((-14.8, 5.6), (-16.9, 3.5), (-16.9, 1.5), (-22.3, 1.5), (-22.3, 5.6), align=None)
        Polygon((22.3, 1.5), (22.3, 5.6), (14.8, 5.6), (16.9, 3.5), (16.9, 1.5), align=None)
    extrude(amount=-CUT_EXTRUDE_3_DEPTH, mode=Mode.SUBTRACT)

    # 草图8 → 切除-拉伸4 (cut)
    with BuildSketch(Plane(origin=(0, 1.5, 0), x_dir=(1, 0, 0), z_dir=(0, 1, 0))):
        with Locations((-18.55, 0)):
            Circle(SKETCH_8_R)
        with Locations((18.55, 0)):
            Circle(SKETCH_8_R)
    extrude(amount=CUT_EXTRUDE_4_DEPTH, mode=Mode.SUBTRACT)

    # 草图9 → 切除-拉伸5 (cut)
    with BuildSketch(Plane(origin=(0, 1.5, 0), x_dir=(1, 0, 0), z_dir=(0, 1, 0))):
        with Locations(Location((-18.55, 0, 0), (0, 0, 180))):
            Circle(SKETCH_9_R)
        with Locations(Location((18.55, 0, 0), (0, 0, 180))):
            Circle(SKETCH_9_R)
    extrude(amount=-CUT_EXTRUDE_5_DEPTH, mode=Mode.SUBTRACT)

    # 草图10 → 切除-拉伸6 (cut)
    with BuildSketch(Plane.XZ):
        Polygon((-14, 5.75), (-5.35, 5.75), (-5.35, 6.55), (5.35, 6.55), (5.35, 5.75), (14, 5.75), (14, -5.75), (-14, -5.75), align=None)
    extrude(amount=-CUT_EXTRUDE_6_DEPTH, mode=Mode.SUBTRACT)

    # 草图11 → 凸台-拉伸5 (add)
    with BuildSketch(Plane.XY.offset(6.55)):
        with Locations((0, 4)):
            Rectangle(SKETCH_11_W, SKETCH_11_H)
    extrude(amount=EXTRUDE_5_DEPTH)

    # 凸台-拉伸6: up to this face of the body (flat: up to its plane)
    extrude_6_end = Plane(part.part.faces().sort_by_distance((-0.75, 12.3, 4.25))[0])
    # 草图12 → 凸台-拉伸6 (add, up to the picked face)
    with BuildSketch(Plane.XY.offset(12.25), mode=Mode.PRIVATE) as extrude_6_sk1:
        with Locations((0, 7.15)):
            Rectangle(SKETCH_12_W, SKETCH_12_H)
    extrude_6_tool1 = split(extrude(extrude_6_sk1.sketch, amount=-EXTRUDE_6_REACH, mode=Mode.PRIVATE), bisect_by=extrude_6_end, keep=Keep.BOTH, mode=Mode.PRIVATE)
    add(extrude_6_tool1.solids().sort_by(Axis((0, 7.15, 12.25), (0, 0, -1)))[0])

    # 草图13 → 切除-拉伸7 (cut)
    with BuildSketch(Plane.XY.offset(12.25)):
        with Locations((0, 7.15)):
            Rectangle(SKETCH_13_W, SKETCH_13_H)
    extrude(amount=-CUT_EXTRUDE_7_DEPTH, mode=Mode.SUBTRACT)

    # 草图14 → 切除-拉伸8 (cut)
    with BuildSketch(Plane.ZY.offset(4)):
        with Locations((10.543297514, 8.10113554)):
            Rectangle(SKETCH_14_W, SKETCH_14_H)
    extrude(amount=-CUT_EXTRUDE_8_DEPTH, mode=Mode.SUBTRACT)

    # 草图15 → 切除-拉伸9 (cut)
    with BuildSketch(Plane(origin=(0, 9.7, 0), x_dir=(1, 0, 0), z_dir=(0, 1, 0))):
        with Locations((-2.427883841, -9.241170147)):
            Rectangle(SKETCH_15_W, SKETCH_15_H)
        with Locations((0, -9.601897215)):
            Rectangle(SKETCH_15_W_2, SKETCH_15_H_2)
        with Locations((2.427883841, -9.241170147)):
            Rectangle(SKETCH_15_W, SKETCH_15_H)
    extrude(amount=-CUT_EXTRUDE_9_DEPTH, mode=Mode.SUBTRACT)

    # 草图16 → 凸台-拉伸7 (add)
    with BuildSketch(Plane.XY.offset(4.55)):
        with Locations((-1.752126005, 7.223491528)):
            Rectangle(SKETCH_16_W, SKETCH_16_H)
        with Locations((-0.021789285, 7.223491528)):
            Rectangle(SKETCH_16_W, SKETCH_16_H)
        with Locations((1.690708913, 7.205653006)):
            Rectangle(SKETCH_16_W_2, SKETCH_16_H_2)
    extrude(amount=EXTRUDE_7_DEPTH)

    # 草图17 → 凸台-拉伸8 (add)
    with BuildSketch(Plane(origin=(0, 11.7, 0), x_dir=(1, 0, 0), z_dir=(0, 1, 0))):
        with Locations(Location((9.523383973, -0.019035269, 0), (0, 0, 90))):
            Circle(SKETCH_17_R)
    extrude(amount=EXTRUDE_8_DEPTH)

    # 圆角3
    fillet_3_edges = [part.edges().sort_by_distance(p)[0] for p in [
        (9.523383973, 20.7, 4.469035269),
    ]]
    fillet(fillet_3_edges, radius=FILLET_3_R)

    # 圆角4
    fillet_4_edges = [part.edges().sort_by_distance(p)[0] for p in [
        (14.016278165, 16.7, -4.5),
        (14.016278165, 16.7, 4.5),
        (5.016278165, 16.7, 4.5),
        (5.016278165, 16.7, -4.5),
    ]]
    fillet(fillet_4_edges, radius=FILLET_4_R)

    # 草图18 → 切除-拉伸10 (cut)
    with BuildSketch(Plane(origin=(0, 11.7, 0), x_dir=(1, 0, 0), z_dir=(0, 1, 0))):
        with Locations((-10.271744936, 0)):
            Rectangle(SKETCH_18_W, SKETCH_18_H)
    extrude(amount=-CUT_EXTRUDE_10_DEPTH, mode=Mode.SUBTRACT)

    # 草图19 → 凸台-拉伸9 (add)
    with BuildSketch(Plane(origin=(0, 9.7, 0), x_dir=(1, 0, 0), z_dir=(0, 1, 0))):
        with Locations(Location((-10.279996895, 0.03221439, 0), (0, 0, 270))):
            Circle(SKETCH_19_R)
    extrude(amount=EXTRUDE_9_DEPTH)

    # 圆角6
    fillet_6_edges = [part.edges().sort_by_distance(p)[0] for p in [
        (-10.279996895, 16.7, -3.53221439),
    ]]
    fillet(fillet_6_edges, radius=FILLET_6_R)

    # 圆角7
    fillet_7_edges = [part.edges().sort_by_distance(p)[0] for p in [
        (-6.421744936, 15.7, -4.5),
        (-6.421744936, 15.7, 4.5),
        (-14.121744936, 15.7, 4.5),
        (-14.121744936, 15.7, -4.5),
    ]]
    fillet(fillet_7_edges, radius=FILLET_7_R)


solid = part.part
